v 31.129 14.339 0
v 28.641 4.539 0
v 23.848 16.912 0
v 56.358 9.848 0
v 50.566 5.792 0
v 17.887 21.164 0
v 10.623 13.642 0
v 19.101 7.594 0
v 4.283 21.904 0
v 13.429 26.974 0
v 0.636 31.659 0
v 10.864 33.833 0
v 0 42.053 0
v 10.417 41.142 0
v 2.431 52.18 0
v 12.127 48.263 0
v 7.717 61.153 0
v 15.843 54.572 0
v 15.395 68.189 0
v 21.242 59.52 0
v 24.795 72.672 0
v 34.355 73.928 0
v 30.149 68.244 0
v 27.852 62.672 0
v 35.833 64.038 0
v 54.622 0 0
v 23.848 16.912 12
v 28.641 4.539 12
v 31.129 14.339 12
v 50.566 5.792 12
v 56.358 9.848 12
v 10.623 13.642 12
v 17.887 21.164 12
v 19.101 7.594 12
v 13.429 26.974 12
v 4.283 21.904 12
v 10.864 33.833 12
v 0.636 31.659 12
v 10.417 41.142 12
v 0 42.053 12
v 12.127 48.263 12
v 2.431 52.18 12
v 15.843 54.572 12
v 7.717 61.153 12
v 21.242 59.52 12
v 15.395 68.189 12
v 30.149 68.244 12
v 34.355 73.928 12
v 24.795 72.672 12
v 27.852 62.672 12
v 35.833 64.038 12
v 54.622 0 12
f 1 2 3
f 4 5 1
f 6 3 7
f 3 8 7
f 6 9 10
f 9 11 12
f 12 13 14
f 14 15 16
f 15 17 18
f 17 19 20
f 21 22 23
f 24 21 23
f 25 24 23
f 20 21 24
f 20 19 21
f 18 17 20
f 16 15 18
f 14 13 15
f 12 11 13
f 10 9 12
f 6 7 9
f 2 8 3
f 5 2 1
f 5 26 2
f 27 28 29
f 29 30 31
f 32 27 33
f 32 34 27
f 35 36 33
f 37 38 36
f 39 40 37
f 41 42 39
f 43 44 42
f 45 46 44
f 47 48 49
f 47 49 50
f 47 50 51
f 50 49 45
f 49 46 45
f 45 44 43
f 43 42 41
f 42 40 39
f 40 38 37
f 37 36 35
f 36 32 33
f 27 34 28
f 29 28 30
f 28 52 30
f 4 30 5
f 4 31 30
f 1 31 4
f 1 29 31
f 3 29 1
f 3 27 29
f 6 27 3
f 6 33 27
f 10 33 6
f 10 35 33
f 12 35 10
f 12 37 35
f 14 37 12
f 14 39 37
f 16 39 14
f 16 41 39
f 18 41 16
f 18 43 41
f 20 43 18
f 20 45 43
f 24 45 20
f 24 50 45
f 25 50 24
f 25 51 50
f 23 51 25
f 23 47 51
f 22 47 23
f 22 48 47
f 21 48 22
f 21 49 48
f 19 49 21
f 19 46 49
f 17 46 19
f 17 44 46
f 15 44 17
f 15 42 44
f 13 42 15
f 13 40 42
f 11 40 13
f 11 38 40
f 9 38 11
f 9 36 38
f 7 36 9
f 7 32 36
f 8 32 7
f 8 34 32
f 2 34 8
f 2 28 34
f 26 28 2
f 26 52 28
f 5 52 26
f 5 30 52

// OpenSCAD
$fn = 32;

// ----------------------------------------------------------------------
// Hook plate: curl radius 30 mm over 170 degrees, 10 mm thick band
// ----------------------------------------------------------------------

// --- parameters (mm) ---
profile_height = 12;      // extrusion height
profile_points = 26;      // points of the closed outline

profile = [[30.149, 68.244], [34.355, 73.928], [24.795, 72.672], [15.395, 68.189], [7.717, 61.153], [2.431, 52.18], [0, 42.053], [0.636, 31.659], [4.283, 21.904], [10.623, 13.642], [19.101, 7.594], [28.641, 4.539], [54.622, 0], [50.566, 5.792], [56.358, 9.848], [31.129, 14.339], [23.848, 16.912], [17.887, 21.164], [13.429, 26.974], [10.864, 33.833], [10.417, 41.142], [12.127, 48.263], [15.843, 54.572], [21.242, 59.52], [27.852, 62.672], [35.833, 64.038]];  // single closed polygon, 26 points, counter clockwise

// --- the one profile operation ---
linear_extrude(height = profile_height) polygon(points = profile);
